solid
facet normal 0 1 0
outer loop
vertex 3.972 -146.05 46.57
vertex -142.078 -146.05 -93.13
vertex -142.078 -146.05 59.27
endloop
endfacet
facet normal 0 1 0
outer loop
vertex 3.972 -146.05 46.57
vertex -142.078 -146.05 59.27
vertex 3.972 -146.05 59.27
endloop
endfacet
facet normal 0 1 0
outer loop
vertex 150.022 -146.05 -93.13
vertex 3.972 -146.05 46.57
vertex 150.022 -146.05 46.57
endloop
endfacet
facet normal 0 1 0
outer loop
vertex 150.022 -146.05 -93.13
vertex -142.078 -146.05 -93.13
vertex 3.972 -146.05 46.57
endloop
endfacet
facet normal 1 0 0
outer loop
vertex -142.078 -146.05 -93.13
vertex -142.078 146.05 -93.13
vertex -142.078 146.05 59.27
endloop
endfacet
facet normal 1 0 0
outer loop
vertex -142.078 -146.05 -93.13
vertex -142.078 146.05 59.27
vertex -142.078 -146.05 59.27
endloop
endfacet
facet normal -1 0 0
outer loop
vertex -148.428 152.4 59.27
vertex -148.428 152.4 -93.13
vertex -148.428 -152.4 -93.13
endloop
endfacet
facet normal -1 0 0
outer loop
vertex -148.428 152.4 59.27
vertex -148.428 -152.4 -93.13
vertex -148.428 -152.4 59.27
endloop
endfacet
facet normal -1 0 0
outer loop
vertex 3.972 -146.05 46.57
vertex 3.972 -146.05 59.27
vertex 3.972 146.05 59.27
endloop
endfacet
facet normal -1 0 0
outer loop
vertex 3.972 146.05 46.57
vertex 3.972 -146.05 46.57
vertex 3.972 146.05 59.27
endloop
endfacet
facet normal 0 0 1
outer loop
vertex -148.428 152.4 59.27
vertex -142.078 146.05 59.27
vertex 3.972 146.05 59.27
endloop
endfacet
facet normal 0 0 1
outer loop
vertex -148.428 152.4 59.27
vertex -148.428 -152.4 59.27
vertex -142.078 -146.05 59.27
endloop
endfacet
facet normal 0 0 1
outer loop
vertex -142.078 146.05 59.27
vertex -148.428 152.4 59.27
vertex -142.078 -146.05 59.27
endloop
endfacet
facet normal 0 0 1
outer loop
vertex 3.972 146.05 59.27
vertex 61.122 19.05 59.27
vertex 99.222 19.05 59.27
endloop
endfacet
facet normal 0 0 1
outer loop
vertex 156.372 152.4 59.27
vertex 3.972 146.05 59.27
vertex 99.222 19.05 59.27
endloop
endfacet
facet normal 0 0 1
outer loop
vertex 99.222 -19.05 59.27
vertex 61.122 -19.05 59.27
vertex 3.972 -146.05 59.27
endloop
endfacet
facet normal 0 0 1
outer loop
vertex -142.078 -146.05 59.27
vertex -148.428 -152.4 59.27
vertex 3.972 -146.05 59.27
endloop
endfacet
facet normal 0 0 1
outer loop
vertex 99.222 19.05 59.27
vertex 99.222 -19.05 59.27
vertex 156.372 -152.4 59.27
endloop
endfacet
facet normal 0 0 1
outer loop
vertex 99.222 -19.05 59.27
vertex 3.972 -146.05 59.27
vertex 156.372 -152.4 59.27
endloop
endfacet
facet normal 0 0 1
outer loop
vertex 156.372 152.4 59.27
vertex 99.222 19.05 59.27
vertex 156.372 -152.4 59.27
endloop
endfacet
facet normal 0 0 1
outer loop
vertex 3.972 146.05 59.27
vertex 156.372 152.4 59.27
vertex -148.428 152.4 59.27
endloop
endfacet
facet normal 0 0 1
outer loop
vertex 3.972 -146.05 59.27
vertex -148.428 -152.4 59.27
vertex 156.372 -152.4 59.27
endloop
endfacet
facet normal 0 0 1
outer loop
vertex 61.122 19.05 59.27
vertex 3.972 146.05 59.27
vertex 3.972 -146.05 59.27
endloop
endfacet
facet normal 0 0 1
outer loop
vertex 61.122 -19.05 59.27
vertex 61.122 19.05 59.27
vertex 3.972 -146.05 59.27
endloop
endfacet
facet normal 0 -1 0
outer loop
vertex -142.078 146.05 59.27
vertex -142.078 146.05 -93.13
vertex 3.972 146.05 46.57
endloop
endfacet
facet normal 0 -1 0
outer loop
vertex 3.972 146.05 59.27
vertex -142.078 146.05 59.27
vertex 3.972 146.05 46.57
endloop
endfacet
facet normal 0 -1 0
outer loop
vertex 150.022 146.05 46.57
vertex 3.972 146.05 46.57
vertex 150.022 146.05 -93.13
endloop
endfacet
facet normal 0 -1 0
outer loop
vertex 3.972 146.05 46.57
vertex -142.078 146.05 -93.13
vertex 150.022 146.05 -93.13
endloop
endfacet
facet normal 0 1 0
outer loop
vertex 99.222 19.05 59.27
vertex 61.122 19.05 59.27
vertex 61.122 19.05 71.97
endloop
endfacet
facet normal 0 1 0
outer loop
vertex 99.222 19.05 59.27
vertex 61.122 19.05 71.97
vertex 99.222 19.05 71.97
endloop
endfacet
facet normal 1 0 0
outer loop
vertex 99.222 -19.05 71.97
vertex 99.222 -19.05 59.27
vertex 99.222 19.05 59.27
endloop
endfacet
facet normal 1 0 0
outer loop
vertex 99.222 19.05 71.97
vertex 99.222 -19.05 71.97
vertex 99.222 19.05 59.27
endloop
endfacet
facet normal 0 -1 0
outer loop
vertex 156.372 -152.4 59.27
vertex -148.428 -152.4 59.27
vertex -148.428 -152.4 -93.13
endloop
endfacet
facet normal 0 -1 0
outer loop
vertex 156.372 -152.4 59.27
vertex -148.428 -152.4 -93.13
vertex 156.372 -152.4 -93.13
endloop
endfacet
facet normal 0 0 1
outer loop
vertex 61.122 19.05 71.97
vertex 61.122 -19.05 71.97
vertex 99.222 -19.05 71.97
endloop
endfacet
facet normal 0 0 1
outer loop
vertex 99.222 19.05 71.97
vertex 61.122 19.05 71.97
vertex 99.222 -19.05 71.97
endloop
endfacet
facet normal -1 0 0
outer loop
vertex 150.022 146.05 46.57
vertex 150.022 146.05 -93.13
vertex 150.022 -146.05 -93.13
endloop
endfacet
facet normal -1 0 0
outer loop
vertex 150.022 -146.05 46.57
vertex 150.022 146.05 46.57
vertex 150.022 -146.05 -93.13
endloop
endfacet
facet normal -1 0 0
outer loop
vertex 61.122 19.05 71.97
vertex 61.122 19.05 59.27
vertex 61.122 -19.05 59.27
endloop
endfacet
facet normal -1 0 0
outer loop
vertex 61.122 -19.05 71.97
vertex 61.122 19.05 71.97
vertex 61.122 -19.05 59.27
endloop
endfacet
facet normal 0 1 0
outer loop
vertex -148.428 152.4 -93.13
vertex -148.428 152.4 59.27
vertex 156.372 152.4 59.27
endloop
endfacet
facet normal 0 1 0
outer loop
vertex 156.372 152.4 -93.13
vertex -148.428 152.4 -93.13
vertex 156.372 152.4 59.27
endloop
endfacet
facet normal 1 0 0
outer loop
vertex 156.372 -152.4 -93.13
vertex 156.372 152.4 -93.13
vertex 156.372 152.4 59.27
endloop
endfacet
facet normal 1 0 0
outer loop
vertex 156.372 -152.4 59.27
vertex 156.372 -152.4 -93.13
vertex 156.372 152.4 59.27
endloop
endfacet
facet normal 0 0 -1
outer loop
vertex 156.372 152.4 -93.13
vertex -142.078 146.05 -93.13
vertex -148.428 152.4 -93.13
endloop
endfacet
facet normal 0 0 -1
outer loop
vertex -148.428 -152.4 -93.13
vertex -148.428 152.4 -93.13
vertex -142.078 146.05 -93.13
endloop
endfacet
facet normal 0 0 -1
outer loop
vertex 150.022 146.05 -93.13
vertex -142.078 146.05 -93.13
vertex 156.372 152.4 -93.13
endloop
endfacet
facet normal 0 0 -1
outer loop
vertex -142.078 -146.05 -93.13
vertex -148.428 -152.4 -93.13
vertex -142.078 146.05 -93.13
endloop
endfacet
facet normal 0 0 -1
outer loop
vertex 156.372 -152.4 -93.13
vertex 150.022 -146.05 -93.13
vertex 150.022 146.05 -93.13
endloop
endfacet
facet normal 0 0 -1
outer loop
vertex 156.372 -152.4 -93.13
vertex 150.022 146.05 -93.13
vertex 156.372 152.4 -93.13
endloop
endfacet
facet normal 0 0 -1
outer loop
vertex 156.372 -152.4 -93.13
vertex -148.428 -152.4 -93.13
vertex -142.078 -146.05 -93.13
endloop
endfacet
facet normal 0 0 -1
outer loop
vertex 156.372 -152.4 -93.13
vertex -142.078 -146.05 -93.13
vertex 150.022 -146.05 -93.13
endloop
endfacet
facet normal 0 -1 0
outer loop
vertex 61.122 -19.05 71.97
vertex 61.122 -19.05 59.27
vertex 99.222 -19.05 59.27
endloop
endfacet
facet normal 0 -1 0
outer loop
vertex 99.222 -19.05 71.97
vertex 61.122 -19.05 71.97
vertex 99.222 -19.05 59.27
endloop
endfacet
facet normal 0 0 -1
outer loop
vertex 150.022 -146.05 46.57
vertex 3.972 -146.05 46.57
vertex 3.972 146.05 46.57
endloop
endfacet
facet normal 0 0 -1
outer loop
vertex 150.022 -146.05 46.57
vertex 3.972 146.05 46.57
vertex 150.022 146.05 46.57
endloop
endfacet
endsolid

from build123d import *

# Parameters (mm, degrees)
F0_W     = 304.8
F0_H     = 152.4
F1_DEPTH = 152.4
F2_W     = 292.1
F2_H     = 292.1
F3_DEPTH = 139.7
F5_DEPTH = 12.7
F4_W     = 38.1
F4_H     = 19.05
F6_DEPTH = 12.7


with BuildPart() as f1:
    # F0 (on Front) → F1 (new body, symmetric)
    with BuildSketch(Plane.XZ):
        with Locations((3.97213, -16.929825)):
            Rectangle(F0_W, F0_H)
    extrude(amount=F1_DEPTH, both=True)

    # F2 (on face) → F3 (cut)
    with BuildSketch(Plane(origin=(0, 0, -93.129825), x_dir=(1, 0, 0), z_dir=(0, 0, -1))):
        with Locations((3.97213, 0)):
            Rectangle(F2_W, F2_H)
    extrude(amount=-F3_DEPTH, mode=Mode.SUBTRACT)

    # F4 (on face) → F5 (cut)
    with BuildSketch(Plane.XY.offset(59.270175)):
        Polygon((3.97213, 0), (3.97213, 146.05), (-142.07787, 146.05), (-142.07787, -146.05), (3.97213, -146.05), align=None)
    extrude(amount=-F5_DEPTH, mode=Mode.SUBTRACT)

    # F4 (on face) → F6 (join)
    with BuildSketch(Plane.XY.offset(59.270175)):
        with Locations((80.17213, 9.525)):
            Rectangle(F4_W, F4_H)
        with Locations((80.17213, -9.525)):
            Rectangle(F4_W, F4_H)
    extrude(amount=F6_DEPTH)


solid = f1.part
